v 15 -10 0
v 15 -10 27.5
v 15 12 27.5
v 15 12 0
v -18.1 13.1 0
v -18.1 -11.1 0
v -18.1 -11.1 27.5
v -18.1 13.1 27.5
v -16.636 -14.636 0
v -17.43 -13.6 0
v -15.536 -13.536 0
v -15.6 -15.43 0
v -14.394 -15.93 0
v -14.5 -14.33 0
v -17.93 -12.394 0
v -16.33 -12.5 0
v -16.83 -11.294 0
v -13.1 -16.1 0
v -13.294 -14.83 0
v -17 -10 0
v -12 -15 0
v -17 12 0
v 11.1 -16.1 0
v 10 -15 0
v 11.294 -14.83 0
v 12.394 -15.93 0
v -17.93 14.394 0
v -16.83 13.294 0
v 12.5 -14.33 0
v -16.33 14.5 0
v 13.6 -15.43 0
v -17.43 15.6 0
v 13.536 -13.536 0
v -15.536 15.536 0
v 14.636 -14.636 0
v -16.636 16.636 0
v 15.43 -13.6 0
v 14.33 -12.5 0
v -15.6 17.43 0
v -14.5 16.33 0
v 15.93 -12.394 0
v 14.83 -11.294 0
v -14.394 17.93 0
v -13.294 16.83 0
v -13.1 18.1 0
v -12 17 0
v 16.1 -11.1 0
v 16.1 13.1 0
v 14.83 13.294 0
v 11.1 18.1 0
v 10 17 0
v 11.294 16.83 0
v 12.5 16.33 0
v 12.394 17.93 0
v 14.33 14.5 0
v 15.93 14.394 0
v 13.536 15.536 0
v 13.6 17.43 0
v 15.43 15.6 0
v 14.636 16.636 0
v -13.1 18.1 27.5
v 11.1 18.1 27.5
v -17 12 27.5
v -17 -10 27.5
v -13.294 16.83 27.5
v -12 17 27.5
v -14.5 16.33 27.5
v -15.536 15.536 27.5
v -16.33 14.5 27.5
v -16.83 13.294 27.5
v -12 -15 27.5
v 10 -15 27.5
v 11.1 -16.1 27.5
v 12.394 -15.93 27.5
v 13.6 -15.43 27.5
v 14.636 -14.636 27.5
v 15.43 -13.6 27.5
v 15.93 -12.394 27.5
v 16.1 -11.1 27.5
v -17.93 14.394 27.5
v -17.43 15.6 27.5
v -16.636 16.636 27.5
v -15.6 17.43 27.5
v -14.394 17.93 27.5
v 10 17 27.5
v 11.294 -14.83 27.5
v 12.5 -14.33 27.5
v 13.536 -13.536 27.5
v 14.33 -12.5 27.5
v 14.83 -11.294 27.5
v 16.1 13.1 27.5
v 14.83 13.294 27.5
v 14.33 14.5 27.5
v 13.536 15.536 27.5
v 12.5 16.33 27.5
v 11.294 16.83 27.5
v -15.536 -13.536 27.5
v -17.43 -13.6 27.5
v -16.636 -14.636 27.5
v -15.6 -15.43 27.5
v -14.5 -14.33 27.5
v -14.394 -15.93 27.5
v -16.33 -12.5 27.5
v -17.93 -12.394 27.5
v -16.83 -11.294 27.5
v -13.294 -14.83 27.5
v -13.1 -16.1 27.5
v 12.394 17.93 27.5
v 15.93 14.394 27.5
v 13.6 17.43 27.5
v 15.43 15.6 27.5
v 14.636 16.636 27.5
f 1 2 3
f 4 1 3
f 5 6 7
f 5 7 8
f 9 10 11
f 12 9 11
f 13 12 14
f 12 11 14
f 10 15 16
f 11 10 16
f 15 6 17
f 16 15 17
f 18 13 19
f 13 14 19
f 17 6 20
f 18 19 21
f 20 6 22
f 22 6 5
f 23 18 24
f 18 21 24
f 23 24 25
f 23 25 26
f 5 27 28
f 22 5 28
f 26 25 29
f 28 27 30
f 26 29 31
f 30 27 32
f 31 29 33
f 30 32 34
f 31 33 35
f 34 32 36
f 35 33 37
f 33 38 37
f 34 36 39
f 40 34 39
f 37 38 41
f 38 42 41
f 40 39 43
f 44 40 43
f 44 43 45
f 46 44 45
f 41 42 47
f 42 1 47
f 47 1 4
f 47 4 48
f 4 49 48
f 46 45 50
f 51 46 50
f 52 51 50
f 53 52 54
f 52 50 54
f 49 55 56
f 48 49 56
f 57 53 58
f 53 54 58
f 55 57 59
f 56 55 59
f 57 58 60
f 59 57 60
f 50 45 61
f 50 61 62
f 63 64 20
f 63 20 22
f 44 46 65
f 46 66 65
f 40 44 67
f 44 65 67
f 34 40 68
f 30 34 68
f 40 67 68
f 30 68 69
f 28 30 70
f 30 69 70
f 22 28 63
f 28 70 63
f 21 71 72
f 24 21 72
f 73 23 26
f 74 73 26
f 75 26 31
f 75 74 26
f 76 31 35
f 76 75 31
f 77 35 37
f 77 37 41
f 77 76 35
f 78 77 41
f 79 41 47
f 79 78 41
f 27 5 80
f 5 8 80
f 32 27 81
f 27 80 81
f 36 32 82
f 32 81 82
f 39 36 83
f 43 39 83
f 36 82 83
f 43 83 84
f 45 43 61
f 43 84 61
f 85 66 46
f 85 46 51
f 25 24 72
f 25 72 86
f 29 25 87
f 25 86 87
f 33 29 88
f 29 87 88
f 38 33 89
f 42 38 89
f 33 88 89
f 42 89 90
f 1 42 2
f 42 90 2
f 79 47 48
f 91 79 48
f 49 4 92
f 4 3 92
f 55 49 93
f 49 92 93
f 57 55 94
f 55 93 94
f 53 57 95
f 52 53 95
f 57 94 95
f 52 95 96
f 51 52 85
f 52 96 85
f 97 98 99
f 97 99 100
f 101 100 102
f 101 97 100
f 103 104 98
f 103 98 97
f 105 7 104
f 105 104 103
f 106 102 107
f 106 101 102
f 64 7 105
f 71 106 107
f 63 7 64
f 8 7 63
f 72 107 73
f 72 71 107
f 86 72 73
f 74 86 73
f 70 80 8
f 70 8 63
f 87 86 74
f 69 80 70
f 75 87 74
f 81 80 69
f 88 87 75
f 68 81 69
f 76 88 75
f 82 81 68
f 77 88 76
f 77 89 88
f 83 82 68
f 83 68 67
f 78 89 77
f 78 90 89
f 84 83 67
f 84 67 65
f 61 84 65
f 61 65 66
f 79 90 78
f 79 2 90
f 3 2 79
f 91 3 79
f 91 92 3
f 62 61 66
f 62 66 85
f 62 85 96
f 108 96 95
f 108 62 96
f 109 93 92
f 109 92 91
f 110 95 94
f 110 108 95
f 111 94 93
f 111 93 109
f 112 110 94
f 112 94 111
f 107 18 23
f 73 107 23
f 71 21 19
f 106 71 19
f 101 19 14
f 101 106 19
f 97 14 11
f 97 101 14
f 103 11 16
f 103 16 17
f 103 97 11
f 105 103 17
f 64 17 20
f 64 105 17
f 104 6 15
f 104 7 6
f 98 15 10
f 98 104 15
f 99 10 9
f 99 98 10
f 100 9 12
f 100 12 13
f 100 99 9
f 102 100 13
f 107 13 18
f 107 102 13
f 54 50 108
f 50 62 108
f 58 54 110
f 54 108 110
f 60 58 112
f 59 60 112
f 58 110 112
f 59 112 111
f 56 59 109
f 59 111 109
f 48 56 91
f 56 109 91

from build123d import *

# Parameters (mm, degrees)
F0_W     = 34.200002
F0_H     = 34.200002
F0_W_2   = 32
F0_H_2   = 32
F1_DEPTH = 27.5
F2_R     = 5


with BuildPart() as f1:
    # F0 (on Top) → F1 (new body)
    with BuildSketch(Plane.XY):
        with Locations((-1, 1)):
            Rectangle(F0_W, F0_H)
        with Locations((-1, 1)):
            Rectangle(F0_W_2, F0_H_2, mode=Mode.SUBTRACT)
    extrude(amount=F1_DEPTH)

    # F2
    f2_edges = [f1.edges().sort_by_distance(p)[0] for p in [
        (16.100001, -16.100001, 13.75),
        (16.100001, 18.100001, 13.75),
        (-18.100001, -16.100001, 13.75),
        (-17, 17, 13.75),
        (-17, -15, 13.75),
        (15, -15, 13.75),
        (15, 17, 13.75),
        (-18.100001, 18.100001, 13.75),
    ]]
    fillet(f2_edges, radius=F2_R)


solid = f1.part
